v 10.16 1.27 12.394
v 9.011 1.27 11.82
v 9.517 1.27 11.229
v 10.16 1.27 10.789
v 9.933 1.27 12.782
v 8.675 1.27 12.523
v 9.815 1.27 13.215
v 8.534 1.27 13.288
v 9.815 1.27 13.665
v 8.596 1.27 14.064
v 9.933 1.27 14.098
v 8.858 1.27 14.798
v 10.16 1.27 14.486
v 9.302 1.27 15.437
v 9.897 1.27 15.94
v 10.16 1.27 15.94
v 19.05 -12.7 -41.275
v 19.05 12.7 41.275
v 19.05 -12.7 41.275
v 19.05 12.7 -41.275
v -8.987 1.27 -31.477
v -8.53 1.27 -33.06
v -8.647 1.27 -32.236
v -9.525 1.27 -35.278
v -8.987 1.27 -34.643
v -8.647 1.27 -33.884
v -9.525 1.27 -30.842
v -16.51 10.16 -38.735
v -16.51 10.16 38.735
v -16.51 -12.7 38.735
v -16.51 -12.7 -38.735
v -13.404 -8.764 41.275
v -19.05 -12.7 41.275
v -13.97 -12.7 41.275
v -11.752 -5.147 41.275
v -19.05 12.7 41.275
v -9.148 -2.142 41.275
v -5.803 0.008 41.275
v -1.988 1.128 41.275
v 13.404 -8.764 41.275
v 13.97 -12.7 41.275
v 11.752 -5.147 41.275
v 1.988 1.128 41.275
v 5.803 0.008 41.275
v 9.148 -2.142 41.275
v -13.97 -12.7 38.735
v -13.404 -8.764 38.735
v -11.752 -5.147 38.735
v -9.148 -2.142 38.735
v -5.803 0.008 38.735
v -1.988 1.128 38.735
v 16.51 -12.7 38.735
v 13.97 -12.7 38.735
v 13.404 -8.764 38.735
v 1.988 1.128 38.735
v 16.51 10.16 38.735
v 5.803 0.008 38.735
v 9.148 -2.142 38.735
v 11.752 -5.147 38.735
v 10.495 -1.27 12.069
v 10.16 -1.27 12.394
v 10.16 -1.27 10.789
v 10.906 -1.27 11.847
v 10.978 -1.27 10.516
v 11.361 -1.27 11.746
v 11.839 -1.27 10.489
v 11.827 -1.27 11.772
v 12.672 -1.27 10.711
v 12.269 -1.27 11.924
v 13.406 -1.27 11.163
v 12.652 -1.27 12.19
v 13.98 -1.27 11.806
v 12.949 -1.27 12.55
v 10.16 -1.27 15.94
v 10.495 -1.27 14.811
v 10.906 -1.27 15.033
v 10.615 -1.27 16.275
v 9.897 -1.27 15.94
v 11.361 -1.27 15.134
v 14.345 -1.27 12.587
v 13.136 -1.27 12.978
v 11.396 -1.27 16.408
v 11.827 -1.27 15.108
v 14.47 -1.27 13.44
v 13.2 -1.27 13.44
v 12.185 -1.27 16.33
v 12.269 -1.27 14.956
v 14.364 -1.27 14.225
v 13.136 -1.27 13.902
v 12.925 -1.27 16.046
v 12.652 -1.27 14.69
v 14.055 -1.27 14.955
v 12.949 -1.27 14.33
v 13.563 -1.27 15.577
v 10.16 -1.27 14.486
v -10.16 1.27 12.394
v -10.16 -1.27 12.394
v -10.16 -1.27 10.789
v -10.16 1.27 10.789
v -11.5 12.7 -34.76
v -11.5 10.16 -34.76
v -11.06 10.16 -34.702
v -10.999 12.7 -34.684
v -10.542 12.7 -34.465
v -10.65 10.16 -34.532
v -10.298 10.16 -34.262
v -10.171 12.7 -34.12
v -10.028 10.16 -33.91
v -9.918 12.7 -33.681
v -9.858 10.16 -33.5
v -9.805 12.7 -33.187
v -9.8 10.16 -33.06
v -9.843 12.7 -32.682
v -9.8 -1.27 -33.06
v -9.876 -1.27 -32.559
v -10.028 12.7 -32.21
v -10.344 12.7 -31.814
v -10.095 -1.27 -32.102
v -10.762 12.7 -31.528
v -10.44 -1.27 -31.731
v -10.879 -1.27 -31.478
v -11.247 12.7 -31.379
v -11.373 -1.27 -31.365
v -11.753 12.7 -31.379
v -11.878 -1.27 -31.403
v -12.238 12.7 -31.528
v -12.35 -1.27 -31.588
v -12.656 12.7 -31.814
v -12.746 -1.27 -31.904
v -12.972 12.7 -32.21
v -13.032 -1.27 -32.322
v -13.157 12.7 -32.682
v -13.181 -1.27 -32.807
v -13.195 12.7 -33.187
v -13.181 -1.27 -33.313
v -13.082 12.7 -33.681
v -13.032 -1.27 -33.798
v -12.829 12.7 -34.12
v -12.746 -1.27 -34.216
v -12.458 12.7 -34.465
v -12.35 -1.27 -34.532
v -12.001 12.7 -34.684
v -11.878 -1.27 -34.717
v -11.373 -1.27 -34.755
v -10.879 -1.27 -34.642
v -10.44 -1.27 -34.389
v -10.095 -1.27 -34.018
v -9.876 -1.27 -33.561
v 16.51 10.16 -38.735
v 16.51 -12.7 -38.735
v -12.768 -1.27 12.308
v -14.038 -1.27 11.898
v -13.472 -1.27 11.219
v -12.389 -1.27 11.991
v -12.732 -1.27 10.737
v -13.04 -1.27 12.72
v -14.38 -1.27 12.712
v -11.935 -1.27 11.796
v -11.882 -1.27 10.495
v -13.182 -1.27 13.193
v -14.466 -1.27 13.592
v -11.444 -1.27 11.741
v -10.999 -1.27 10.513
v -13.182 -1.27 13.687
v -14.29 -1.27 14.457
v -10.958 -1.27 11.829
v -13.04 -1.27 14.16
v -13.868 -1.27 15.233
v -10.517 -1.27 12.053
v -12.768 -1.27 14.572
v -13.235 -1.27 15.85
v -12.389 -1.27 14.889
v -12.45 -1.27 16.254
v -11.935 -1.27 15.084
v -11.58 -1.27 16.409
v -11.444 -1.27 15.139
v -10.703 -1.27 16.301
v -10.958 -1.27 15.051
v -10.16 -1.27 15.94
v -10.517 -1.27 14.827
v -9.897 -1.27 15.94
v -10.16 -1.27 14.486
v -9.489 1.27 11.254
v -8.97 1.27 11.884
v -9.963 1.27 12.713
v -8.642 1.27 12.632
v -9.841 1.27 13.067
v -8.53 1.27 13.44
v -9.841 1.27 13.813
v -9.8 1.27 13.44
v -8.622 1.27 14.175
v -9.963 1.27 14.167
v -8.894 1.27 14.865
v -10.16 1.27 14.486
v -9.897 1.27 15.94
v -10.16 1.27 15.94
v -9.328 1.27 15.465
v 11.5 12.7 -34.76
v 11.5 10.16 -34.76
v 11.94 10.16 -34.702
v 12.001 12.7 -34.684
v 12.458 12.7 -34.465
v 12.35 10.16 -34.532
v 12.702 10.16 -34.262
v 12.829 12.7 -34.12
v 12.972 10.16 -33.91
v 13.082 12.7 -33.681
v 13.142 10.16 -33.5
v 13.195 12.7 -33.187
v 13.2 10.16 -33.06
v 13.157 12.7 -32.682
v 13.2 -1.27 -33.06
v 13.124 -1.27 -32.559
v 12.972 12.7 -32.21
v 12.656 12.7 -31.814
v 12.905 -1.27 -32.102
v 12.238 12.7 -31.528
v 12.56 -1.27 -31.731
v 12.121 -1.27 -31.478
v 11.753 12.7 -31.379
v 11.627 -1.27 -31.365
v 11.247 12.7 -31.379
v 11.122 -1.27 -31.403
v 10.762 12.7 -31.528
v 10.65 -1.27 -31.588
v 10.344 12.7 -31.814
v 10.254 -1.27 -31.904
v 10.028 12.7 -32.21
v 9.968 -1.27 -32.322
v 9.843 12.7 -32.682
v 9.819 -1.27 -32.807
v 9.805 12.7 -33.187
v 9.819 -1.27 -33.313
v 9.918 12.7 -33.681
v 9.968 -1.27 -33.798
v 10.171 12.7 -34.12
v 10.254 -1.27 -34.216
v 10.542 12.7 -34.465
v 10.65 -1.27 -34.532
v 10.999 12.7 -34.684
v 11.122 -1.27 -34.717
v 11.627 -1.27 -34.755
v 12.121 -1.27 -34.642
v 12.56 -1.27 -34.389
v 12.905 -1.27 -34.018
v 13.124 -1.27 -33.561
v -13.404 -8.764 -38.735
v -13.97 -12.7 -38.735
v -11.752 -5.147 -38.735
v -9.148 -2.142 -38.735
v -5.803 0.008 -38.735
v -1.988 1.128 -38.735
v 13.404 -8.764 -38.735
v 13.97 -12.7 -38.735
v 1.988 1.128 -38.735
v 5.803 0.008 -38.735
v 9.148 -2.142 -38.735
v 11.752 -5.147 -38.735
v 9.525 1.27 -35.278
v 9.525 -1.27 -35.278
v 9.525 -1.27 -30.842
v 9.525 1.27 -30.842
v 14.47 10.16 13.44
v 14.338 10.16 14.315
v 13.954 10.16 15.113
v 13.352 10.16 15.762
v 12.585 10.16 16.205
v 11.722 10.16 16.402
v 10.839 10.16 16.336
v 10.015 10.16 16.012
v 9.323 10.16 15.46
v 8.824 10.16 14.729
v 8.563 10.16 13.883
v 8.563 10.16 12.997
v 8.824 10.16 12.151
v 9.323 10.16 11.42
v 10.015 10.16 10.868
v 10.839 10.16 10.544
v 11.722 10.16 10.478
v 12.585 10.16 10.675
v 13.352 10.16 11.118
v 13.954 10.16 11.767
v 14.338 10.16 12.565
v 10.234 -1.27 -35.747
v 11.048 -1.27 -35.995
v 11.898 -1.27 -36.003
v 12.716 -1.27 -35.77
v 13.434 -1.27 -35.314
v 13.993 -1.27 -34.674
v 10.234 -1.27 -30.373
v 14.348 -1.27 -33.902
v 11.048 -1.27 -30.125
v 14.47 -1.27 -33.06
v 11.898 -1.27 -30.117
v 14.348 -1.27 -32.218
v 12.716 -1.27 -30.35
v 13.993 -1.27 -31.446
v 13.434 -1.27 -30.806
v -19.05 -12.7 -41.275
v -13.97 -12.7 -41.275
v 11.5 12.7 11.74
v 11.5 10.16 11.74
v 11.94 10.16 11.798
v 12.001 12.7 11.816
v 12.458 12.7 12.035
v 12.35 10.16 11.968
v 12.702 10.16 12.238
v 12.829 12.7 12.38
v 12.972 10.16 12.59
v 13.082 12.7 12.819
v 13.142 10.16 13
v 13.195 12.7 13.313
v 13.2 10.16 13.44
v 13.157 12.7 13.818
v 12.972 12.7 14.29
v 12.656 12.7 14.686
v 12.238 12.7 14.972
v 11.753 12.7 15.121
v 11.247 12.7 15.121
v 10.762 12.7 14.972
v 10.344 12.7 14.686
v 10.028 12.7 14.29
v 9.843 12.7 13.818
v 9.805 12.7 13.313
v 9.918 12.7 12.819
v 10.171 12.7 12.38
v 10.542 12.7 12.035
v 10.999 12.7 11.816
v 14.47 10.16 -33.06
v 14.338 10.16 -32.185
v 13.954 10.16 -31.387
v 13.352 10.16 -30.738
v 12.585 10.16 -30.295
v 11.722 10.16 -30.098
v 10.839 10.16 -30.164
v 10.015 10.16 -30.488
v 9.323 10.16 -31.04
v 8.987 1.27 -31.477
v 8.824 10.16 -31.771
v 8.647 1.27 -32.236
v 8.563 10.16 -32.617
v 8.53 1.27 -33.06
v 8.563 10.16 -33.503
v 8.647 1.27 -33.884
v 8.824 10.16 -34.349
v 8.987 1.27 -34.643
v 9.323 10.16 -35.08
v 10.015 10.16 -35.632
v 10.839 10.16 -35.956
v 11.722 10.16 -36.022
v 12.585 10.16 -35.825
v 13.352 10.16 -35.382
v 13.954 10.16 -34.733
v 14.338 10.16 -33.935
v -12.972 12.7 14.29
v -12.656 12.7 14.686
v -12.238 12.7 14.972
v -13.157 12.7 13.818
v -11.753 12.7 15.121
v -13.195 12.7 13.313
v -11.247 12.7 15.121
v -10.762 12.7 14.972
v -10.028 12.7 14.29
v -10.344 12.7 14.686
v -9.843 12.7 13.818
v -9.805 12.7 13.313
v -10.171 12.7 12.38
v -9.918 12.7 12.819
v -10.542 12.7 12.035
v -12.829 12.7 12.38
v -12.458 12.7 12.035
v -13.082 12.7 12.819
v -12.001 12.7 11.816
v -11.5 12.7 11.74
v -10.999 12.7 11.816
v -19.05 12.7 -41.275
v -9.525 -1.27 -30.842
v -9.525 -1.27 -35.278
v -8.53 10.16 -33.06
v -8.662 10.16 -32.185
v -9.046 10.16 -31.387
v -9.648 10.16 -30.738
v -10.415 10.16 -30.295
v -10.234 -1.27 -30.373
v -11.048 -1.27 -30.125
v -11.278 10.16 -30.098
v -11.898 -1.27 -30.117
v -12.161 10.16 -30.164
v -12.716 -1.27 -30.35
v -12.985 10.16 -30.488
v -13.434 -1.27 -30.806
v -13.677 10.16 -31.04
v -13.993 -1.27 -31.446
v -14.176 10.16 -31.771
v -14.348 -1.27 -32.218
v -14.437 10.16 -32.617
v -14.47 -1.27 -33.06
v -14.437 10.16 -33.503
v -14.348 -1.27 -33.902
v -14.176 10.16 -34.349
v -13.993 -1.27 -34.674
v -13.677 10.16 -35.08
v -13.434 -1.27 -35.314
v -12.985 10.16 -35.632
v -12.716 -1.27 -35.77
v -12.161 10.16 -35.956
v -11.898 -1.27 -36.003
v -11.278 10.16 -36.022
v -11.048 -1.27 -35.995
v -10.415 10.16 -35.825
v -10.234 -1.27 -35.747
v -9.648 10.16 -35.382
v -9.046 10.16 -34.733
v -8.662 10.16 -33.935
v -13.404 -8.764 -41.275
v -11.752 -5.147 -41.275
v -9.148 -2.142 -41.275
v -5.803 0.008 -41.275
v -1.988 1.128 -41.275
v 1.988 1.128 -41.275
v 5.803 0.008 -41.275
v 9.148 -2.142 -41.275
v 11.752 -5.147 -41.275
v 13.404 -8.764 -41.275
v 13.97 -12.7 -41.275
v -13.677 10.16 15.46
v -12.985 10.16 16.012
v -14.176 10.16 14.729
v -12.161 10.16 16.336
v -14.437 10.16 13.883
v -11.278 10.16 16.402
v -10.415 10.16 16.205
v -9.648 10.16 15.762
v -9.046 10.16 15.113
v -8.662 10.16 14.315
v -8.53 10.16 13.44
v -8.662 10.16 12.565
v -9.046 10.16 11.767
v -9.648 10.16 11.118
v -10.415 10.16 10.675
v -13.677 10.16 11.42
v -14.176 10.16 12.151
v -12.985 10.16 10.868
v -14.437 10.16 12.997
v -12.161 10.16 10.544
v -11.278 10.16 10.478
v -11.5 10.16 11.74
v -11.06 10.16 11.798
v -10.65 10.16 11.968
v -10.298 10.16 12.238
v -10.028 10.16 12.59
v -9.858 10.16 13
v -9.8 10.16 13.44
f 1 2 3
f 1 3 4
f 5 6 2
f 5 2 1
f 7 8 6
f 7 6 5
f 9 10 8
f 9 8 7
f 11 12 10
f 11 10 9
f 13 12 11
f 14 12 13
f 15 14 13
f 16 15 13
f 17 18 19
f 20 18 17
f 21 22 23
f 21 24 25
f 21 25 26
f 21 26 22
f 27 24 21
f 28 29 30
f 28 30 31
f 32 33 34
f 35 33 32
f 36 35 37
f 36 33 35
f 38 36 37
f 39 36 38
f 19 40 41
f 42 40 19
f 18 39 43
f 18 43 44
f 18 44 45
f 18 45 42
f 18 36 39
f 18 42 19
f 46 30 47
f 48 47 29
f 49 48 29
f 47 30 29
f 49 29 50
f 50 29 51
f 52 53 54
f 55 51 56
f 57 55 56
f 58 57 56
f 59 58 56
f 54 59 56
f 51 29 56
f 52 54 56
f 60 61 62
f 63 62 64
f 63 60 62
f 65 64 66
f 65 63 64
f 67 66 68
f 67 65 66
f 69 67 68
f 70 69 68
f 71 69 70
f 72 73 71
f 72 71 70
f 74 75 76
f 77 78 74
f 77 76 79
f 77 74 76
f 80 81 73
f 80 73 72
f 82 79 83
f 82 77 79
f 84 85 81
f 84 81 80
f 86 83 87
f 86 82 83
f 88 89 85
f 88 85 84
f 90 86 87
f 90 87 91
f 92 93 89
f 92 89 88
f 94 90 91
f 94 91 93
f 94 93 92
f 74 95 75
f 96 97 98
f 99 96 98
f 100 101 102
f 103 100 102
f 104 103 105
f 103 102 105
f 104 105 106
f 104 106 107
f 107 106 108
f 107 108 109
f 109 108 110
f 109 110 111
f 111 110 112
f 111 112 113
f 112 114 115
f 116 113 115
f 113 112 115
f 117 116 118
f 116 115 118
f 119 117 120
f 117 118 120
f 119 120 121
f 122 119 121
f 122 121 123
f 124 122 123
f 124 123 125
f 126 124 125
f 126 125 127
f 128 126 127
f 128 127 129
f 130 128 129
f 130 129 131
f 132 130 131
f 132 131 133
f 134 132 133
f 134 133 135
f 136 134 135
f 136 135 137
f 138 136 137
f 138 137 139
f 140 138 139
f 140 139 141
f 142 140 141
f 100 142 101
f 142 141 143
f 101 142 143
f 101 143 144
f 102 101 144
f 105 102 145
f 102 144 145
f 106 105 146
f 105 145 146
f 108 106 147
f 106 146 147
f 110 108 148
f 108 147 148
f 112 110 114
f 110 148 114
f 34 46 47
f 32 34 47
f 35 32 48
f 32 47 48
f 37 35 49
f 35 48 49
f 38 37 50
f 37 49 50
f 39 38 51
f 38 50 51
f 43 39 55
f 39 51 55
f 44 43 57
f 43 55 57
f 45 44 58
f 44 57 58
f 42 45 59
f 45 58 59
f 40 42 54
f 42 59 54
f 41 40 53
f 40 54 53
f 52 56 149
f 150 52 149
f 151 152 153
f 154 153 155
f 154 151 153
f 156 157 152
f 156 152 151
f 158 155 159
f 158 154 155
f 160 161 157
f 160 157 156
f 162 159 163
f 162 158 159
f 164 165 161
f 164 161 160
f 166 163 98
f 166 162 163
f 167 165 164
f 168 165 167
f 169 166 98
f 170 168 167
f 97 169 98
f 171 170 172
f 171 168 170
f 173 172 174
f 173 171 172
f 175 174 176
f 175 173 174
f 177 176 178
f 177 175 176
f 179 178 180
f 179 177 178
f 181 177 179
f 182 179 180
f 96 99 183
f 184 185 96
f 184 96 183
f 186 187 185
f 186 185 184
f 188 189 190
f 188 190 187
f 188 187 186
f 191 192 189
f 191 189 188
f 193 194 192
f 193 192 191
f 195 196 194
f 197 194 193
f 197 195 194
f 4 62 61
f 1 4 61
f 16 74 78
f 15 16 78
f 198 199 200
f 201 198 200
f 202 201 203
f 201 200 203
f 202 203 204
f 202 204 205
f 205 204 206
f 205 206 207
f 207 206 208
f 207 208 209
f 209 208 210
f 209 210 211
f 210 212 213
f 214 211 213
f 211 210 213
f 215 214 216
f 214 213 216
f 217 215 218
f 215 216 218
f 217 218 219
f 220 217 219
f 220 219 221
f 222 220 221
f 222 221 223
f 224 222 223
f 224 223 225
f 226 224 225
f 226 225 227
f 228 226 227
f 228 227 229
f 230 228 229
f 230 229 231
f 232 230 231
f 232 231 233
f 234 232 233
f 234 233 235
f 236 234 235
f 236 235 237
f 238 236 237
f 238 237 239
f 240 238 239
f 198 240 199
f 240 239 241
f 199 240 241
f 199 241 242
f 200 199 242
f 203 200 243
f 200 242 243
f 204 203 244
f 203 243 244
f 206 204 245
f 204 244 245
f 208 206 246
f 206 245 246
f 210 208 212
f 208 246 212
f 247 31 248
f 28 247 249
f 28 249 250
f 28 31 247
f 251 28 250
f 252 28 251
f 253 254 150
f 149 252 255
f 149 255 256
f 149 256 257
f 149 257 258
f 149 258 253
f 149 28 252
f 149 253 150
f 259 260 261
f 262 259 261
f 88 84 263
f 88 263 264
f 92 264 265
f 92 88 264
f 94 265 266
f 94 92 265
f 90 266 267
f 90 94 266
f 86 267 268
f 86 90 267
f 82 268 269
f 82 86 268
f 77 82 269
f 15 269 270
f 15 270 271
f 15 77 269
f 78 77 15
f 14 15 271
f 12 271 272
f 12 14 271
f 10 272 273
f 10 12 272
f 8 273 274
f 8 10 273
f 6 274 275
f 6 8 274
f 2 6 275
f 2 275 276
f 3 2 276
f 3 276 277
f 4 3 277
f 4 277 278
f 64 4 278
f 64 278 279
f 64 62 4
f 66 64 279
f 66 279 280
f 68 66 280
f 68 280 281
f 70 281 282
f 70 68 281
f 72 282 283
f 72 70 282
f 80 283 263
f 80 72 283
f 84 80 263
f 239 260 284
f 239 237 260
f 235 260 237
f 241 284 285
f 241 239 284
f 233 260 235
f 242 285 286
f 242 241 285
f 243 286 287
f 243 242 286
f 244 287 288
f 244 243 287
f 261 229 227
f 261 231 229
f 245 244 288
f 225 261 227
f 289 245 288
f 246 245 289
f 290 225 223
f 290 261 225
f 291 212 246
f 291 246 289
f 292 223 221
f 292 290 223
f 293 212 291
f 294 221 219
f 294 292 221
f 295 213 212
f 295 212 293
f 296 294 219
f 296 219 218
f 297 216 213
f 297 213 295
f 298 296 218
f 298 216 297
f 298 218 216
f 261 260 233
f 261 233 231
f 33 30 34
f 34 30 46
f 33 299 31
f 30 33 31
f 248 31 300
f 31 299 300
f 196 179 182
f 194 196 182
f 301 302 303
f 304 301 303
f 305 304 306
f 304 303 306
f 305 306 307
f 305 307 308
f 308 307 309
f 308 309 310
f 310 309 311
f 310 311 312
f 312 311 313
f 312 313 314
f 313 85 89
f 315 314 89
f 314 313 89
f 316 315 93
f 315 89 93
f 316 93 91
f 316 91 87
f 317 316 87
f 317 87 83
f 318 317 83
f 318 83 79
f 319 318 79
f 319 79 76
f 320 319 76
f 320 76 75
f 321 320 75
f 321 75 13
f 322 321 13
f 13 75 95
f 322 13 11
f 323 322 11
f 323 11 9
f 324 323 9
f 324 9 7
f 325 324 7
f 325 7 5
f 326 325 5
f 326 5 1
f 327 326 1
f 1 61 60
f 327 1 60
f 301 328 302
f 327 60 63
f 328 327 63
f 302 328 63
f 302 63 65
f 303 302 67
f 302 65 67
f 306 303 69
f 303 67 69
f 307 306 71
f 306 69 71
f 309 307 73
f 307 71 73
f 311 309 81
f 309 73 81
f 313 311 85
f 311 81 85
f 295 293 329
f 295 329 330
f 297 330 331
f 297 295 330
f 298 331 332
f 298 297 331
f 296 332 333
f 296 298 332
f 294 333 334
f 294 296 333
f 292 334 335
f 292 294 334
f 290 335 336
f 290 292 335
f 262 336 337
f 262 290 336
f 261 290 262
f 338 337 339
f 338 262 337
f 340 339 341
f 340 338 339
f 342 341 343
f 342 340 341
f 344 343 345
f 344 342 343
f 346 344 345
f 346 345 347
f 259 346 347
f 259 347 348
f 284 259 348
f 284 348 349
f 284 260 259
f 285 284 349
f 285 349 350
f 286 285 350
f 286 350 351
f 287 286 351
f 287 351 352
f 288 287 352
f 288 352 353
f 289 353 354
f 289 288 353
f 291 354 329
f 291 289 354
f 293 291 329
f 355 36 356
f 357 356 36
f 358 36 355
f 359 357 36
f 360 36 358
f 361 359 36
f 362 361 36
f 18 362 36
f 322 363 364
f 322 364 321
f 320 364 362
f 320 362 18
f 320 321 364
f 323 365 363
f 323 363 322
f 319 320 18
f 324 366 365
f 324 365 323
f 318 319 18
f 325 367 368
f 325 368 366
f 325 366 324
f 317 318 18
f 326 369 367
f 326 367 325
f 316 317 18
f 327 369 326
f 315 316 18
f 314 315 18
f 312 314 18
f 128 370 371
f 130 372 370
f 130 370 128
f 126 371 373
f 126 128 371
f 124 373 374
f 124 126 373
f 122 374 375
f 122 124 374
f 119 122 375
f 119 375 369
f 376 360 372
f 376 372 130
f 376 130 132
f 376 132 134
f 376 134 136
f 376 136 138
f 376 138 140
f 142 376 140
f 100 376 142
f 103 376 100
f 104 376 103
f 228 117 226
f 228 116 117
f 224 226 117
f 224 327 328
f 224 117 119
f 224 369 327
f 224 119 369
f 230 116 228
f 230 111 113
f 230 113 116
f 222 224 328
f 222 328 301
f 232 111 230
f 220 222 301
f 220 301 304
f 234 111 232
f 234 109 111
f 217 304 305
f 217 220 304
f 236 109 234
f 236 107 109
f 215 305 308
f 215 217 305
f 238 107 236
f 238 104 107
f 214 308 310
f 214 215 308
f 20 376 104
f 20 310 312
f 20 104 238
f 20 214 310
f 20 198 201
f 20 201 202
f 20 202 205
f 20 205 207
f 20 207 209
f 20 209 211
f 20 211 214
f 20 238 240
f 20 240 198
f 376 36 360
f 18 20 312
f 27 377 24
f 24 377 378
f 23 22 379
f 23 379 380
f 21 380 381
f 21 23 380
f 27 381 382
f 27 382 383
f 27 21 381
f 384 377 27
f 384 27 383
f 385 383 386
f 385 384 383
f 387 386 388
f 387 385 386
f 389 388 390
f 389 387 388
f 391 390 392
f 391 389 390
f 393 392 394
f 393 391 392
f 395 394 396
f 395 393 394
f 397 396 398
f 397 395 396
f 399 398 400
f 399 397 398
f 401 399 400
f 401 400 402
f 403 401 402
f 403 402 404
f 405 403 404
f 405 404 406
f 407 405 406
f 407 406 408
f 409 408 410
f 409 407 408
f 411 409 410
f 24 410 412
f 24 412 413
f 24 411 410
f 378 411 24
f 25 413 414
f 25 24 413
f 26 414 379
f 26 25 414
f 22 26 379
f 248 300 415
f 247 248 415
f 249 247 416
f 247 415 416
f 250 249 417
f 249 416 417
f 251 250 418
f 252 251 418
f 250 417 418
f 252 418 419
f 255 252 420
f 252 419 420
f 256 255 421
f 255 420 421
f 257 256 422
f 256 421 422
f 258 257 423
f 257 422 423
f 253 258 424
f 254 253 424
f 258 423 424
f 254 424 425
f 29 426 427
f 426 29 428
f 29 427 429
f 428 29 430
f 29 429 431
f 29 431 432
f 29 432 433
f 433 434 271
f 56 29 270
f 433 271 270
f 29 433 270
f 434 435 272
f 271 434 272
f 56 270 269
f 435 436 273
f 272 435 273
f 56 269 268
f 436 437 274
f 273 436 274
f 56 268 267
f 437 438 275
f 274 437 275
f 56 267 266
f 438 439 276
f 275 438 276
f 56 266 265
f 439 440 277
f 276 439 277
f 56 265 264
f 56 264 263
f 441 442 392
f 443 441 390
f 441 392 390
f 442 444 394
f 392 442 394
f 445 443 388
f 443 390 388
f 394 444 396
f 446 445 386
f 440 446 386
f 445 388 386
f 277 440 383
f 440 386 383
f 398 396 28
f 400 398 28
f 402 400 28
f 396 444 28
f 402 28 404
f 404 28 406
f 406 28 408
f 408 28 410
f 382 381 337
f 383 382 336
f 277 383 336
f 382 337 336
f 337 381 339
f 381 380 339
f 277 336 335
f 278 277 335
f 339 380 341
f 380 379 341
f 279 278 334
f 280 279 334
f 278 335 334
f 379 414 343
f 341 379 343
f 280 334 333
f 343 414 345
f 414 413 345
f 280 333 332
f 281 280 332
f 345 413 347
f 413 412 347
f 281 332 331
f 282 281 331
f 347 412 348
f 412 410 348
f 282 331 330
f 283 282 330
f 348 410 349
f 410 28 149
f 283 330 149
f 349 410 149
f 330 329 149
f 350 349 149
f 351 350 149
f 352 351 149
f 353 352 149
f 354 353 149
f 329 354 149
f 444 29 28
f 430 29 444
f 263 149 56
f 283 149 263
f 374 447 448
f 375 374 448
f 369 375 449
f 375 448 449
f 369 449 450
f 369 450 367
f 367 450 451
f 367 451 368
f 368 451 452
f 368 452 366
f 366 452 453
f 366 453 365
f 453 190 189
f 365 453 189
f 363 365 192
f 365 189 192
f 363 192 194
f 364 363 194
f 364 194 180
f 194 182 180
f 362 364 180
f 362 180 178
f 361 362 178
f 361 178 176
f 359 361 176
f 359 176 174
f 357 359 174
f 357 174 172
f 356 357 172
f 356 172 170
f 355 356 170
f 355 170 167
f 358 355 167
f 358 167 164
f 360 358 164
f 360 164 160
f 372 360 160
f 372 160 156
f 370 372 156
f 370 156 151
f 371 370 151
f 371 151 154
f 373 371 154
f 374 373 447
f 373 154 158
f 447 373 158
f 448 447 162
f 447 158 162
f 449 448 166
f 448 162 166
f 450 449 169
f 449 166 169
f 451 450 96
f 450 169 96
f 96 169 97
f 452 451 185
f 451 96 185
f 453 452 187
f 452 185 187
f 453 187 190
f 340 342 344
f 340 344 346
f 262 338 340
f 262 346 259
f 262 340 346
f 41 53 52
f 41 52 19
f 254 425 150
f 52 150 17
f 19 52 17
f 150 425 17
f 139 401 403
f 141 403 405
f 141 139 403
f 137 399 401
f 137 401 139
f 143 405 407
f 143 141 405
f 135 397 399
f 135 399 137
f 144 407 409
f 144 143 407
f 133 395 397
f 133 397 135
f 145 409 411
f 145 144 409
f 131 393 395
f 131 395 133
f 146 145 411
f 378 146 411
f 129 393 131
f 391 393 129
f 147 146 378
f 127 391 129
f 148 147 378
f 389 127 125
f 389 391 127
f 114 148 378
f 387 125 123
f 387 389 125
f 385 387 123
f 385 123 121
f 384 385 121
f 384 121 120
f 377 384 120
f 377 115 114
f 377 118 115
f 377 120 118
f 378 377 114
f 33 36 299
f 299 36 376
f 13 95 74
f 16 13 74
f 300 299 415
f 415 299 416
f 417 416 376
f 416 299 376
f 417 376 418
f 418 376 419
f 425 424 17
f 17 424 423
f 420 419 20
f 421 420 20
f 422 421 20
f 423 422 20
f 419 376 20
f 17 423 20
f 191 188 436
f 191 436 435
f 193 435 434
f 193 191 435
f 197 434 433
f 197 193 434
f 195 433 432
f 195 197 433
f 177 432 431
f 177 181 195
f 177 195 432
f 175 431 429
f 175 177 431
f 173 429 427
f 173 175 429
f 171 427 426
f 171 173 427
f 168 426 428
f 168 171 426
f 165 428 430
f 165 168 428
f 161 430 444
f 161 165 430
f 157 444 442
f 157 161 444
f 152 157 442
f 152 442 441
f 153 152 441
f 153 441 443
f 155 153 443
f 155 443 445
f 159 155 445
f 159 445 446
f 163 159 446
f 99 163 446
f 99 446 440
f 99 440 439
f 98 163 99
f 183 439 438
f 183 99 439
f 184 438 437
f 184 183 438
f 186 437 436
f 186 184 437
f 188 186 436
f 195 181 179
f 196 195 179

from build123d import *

# Parameters (mm, degrees)
SKETCH1_W           = 38.1
SKETCH1_H           = 82.55
BOSS_EXTRUDE1_DEPTH = 12.7
SHELL1_T            = -2.54
SKETCH2_R           = 13.97
CUT_EXTRUDE1_DEPTH  = 86.666183527
SKETCH3_R           = 1.7
CUT_EXTRUDE2_DEPTH  = 51.883275494
EXTRUDE_THIN1_START = 11.43
SKETCH4_R           = 2.97
SKETCH4_R_2         = 1.7
EXTRUDE_THIN1_DEPTH = 11.43
CUT_EXTRUDE3_DEPTH  = 2.54


with BuildPart() as part:
    # Sketch1 → Boss-Extrude1 (new, symmetric)
    with BuildSketch(Plane(origin=(0, 0, 0), x_dir=(1, 0, 0), z_dir=(0, 1, 0))):
        Rectangle(SKETCH1_W, SKETCH1_H)
    extrude(amount=BOSS_EXTRUDE1_DEPTH, both=True)

    # Shell1
    shell1_openings = [part.faces().sort_by_distance(p)[0] for p in [
        (0, -12.7, 0),
    ]]
    offset(amount=SHELL1_T, openings=shell1_openings, kind=Kind.INTERSECTION)

    # Sketch2 → Cut-Extrude1 (cut, through all)
    with BuildSketch(Plane(origin=(0, 0, -41.275), x_dir=(-1, 0, 0), z_dir=(0, 0, -1))):
        with Locations((0, -12.7)):
            Circle(SKETCH2_R)
    extrude(amount=-CUT_EXTRUDE1_DEPTH, mode=Mode.SUBTRACT)

    # Sketch3 → Cut-Extrude2 (cut, through all)
    with BuildSketch(Plane.XZ.offset(-10.16)):
        with Locations(Location((11.5, 13.44, 0), (0, 0, 270))):
            Circle(SKETCH3_R)
        with Locations(Location((11.5, -33.06, 0), (0, 0, 270))):
            Circle(SKETCH3_R)
        with Locations(Location((-11.5, -33.06, 0), (0, 0, 270))):
            Circle(SKETCH3_R)
        with Locations(Location((-11.5, 13.44, 0), (0, 0, 270))):
            Circle(SKETCH3_R)
    extrude(amount=-CUT_EXTRUDE2_DEPTH, mode=Mode.SUBTRACT)

    # Sketch4 → Extrude-Thin1 (add)
    # profile 1 of 4: a face of its own
    with BuildSketch(Plane.XZ.offset(-10.16).offset(EXTRUDE_THIN1_START)):
        with Locations((11.5, 13.44)):
            Circle(SKETCH4_R)
        with Locations((11.5, 13.44)):
            Circle(SKETCH4_R_2, mode=Mode.SUBTRACT)
    # profile 2 of 4: a face of its own
    with BuildSketch(Plane.XZ.offset(-10.16).offset(EXTRUDE_THIN1_START)):
        with Locations((-11.5, 13.44)):
            Circle(SKETCH4_R)
        with Locations((-11.5, 13.44)):
            Circle(SKETCH4_R_2, mode=Mode.SUBTRACT)
    # profile 3 of 4: a face of its own
    with BuildSketch(Plane.XZ.offset(-10.16).offset(EXTRUDE_THIN1_START)):
        with Locations((-11.5, -33.06)):
            Circle(SKETCH4_R)
        with Locations((-11.5, -33.06)):
            Circle(SKETCH4_R_2, mode=Mode.SUBTRACT)
    # profile 4 of 4: a face of its own
    with BuildSketch(Plane.XZ.offset(-10.16).offset(EXTRUDE_THIN1_START)):
        with Locations((11.5, -33.06)):
            Circle(SKETCH4_R)
        with Locations((11.5, -33.06)):
            Circle(SKETCH4_R_2, mode=Mode.SUBTRACT)
    extrude(amount=-EXTRUDE_THIN1_DEPTH)

    # Sketch5 → Cut-Extrude3 (cut)
    with BuildSketch(Plane.XZ.offset(1.27)):
        Polygon((-10.16, -15.94), (-9.525, -15.94), (-9.525, -36.83), (9.525, -36.83), (9.525, -15.94), (10.16, -15.94), (10.16, 15.94), (-10.16, 15.94), align=None)
    extrude(amount=-CUT_EXTRUDE3_DEPTH, mode=Mode.SUBTRACT)


solid = part.part
